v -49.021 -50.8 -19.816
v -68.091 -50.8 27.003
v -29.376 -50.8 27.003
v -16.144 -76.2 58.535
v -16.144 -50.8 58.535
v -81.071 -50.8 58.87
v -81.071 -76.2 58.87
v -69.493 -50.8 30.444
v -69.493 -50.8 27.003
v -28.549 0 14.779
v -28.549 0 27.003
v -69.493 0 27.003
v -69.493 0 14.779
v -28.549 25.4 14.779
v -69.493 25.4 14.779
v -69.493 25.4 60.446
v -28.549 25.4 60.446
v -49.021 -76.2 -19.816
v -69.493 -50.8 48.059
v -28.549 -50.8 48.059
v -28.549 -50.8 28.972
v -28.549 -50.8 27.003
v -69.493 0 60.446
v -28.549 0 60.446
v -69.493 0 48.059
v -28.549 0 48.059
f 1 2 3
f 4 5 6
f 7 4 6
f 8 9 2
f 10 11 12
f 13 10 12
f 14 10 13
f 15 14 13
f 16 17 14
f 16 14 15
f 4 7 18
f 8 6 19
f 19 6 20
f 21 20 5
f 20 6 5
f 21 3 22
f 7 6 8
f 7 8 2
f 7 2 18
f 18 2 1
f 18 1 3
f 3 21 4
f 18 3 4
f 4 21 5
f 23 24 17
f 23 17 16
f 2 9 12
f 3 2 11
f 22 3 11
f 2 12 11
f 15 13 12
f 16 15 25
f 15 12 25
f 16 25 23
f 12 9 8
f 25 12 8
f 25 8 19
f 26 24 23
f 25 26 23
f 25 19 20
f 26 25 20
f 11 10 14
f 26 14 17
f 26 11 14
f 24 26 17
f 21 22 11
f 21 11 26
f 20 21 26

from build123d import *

# Parameters (mm, degrees)
F0_W     = 40.943392
F0_H     = 21.0566
F1_DEPTH = 50.8
F3_DEPTH = 25.4
F4_W     = 40.943392
F4_H     = 45.667097
F5_DEPTH = 25.4


with BuildPart() as f1:
    # F0 (on Front) → F1 (new body)
    with BuildSketch(Plane.XZ):
        with Locations((-49.021153, 37.531126)):
            Rectangle(F0_W, F0_H)
    extrude(amount=F1_DEPTH)

    # F2 (on face) → F3 (join)
    with BuildSketch(Plane.XZ.offset(50.8)):
        Polygon((-16.144358, 58.535154), (-81.071265, 58.869848), (-49.021153, -19.816248), align=None)
    extrude(amount=F3_DEPTH)

    # F4 (on face) → F5 (join)
    with BuildSketch(Plane(origin=(0, 0, 0), x_dir=(-1, 0, 0), z_dir=(0, 1, 0))):
        with Locations((49.021153, 37.612088)):
            Rectangle(F4_W, F4_H)
    extrude(amount=F5_DEPTH)


solid = f1.part
